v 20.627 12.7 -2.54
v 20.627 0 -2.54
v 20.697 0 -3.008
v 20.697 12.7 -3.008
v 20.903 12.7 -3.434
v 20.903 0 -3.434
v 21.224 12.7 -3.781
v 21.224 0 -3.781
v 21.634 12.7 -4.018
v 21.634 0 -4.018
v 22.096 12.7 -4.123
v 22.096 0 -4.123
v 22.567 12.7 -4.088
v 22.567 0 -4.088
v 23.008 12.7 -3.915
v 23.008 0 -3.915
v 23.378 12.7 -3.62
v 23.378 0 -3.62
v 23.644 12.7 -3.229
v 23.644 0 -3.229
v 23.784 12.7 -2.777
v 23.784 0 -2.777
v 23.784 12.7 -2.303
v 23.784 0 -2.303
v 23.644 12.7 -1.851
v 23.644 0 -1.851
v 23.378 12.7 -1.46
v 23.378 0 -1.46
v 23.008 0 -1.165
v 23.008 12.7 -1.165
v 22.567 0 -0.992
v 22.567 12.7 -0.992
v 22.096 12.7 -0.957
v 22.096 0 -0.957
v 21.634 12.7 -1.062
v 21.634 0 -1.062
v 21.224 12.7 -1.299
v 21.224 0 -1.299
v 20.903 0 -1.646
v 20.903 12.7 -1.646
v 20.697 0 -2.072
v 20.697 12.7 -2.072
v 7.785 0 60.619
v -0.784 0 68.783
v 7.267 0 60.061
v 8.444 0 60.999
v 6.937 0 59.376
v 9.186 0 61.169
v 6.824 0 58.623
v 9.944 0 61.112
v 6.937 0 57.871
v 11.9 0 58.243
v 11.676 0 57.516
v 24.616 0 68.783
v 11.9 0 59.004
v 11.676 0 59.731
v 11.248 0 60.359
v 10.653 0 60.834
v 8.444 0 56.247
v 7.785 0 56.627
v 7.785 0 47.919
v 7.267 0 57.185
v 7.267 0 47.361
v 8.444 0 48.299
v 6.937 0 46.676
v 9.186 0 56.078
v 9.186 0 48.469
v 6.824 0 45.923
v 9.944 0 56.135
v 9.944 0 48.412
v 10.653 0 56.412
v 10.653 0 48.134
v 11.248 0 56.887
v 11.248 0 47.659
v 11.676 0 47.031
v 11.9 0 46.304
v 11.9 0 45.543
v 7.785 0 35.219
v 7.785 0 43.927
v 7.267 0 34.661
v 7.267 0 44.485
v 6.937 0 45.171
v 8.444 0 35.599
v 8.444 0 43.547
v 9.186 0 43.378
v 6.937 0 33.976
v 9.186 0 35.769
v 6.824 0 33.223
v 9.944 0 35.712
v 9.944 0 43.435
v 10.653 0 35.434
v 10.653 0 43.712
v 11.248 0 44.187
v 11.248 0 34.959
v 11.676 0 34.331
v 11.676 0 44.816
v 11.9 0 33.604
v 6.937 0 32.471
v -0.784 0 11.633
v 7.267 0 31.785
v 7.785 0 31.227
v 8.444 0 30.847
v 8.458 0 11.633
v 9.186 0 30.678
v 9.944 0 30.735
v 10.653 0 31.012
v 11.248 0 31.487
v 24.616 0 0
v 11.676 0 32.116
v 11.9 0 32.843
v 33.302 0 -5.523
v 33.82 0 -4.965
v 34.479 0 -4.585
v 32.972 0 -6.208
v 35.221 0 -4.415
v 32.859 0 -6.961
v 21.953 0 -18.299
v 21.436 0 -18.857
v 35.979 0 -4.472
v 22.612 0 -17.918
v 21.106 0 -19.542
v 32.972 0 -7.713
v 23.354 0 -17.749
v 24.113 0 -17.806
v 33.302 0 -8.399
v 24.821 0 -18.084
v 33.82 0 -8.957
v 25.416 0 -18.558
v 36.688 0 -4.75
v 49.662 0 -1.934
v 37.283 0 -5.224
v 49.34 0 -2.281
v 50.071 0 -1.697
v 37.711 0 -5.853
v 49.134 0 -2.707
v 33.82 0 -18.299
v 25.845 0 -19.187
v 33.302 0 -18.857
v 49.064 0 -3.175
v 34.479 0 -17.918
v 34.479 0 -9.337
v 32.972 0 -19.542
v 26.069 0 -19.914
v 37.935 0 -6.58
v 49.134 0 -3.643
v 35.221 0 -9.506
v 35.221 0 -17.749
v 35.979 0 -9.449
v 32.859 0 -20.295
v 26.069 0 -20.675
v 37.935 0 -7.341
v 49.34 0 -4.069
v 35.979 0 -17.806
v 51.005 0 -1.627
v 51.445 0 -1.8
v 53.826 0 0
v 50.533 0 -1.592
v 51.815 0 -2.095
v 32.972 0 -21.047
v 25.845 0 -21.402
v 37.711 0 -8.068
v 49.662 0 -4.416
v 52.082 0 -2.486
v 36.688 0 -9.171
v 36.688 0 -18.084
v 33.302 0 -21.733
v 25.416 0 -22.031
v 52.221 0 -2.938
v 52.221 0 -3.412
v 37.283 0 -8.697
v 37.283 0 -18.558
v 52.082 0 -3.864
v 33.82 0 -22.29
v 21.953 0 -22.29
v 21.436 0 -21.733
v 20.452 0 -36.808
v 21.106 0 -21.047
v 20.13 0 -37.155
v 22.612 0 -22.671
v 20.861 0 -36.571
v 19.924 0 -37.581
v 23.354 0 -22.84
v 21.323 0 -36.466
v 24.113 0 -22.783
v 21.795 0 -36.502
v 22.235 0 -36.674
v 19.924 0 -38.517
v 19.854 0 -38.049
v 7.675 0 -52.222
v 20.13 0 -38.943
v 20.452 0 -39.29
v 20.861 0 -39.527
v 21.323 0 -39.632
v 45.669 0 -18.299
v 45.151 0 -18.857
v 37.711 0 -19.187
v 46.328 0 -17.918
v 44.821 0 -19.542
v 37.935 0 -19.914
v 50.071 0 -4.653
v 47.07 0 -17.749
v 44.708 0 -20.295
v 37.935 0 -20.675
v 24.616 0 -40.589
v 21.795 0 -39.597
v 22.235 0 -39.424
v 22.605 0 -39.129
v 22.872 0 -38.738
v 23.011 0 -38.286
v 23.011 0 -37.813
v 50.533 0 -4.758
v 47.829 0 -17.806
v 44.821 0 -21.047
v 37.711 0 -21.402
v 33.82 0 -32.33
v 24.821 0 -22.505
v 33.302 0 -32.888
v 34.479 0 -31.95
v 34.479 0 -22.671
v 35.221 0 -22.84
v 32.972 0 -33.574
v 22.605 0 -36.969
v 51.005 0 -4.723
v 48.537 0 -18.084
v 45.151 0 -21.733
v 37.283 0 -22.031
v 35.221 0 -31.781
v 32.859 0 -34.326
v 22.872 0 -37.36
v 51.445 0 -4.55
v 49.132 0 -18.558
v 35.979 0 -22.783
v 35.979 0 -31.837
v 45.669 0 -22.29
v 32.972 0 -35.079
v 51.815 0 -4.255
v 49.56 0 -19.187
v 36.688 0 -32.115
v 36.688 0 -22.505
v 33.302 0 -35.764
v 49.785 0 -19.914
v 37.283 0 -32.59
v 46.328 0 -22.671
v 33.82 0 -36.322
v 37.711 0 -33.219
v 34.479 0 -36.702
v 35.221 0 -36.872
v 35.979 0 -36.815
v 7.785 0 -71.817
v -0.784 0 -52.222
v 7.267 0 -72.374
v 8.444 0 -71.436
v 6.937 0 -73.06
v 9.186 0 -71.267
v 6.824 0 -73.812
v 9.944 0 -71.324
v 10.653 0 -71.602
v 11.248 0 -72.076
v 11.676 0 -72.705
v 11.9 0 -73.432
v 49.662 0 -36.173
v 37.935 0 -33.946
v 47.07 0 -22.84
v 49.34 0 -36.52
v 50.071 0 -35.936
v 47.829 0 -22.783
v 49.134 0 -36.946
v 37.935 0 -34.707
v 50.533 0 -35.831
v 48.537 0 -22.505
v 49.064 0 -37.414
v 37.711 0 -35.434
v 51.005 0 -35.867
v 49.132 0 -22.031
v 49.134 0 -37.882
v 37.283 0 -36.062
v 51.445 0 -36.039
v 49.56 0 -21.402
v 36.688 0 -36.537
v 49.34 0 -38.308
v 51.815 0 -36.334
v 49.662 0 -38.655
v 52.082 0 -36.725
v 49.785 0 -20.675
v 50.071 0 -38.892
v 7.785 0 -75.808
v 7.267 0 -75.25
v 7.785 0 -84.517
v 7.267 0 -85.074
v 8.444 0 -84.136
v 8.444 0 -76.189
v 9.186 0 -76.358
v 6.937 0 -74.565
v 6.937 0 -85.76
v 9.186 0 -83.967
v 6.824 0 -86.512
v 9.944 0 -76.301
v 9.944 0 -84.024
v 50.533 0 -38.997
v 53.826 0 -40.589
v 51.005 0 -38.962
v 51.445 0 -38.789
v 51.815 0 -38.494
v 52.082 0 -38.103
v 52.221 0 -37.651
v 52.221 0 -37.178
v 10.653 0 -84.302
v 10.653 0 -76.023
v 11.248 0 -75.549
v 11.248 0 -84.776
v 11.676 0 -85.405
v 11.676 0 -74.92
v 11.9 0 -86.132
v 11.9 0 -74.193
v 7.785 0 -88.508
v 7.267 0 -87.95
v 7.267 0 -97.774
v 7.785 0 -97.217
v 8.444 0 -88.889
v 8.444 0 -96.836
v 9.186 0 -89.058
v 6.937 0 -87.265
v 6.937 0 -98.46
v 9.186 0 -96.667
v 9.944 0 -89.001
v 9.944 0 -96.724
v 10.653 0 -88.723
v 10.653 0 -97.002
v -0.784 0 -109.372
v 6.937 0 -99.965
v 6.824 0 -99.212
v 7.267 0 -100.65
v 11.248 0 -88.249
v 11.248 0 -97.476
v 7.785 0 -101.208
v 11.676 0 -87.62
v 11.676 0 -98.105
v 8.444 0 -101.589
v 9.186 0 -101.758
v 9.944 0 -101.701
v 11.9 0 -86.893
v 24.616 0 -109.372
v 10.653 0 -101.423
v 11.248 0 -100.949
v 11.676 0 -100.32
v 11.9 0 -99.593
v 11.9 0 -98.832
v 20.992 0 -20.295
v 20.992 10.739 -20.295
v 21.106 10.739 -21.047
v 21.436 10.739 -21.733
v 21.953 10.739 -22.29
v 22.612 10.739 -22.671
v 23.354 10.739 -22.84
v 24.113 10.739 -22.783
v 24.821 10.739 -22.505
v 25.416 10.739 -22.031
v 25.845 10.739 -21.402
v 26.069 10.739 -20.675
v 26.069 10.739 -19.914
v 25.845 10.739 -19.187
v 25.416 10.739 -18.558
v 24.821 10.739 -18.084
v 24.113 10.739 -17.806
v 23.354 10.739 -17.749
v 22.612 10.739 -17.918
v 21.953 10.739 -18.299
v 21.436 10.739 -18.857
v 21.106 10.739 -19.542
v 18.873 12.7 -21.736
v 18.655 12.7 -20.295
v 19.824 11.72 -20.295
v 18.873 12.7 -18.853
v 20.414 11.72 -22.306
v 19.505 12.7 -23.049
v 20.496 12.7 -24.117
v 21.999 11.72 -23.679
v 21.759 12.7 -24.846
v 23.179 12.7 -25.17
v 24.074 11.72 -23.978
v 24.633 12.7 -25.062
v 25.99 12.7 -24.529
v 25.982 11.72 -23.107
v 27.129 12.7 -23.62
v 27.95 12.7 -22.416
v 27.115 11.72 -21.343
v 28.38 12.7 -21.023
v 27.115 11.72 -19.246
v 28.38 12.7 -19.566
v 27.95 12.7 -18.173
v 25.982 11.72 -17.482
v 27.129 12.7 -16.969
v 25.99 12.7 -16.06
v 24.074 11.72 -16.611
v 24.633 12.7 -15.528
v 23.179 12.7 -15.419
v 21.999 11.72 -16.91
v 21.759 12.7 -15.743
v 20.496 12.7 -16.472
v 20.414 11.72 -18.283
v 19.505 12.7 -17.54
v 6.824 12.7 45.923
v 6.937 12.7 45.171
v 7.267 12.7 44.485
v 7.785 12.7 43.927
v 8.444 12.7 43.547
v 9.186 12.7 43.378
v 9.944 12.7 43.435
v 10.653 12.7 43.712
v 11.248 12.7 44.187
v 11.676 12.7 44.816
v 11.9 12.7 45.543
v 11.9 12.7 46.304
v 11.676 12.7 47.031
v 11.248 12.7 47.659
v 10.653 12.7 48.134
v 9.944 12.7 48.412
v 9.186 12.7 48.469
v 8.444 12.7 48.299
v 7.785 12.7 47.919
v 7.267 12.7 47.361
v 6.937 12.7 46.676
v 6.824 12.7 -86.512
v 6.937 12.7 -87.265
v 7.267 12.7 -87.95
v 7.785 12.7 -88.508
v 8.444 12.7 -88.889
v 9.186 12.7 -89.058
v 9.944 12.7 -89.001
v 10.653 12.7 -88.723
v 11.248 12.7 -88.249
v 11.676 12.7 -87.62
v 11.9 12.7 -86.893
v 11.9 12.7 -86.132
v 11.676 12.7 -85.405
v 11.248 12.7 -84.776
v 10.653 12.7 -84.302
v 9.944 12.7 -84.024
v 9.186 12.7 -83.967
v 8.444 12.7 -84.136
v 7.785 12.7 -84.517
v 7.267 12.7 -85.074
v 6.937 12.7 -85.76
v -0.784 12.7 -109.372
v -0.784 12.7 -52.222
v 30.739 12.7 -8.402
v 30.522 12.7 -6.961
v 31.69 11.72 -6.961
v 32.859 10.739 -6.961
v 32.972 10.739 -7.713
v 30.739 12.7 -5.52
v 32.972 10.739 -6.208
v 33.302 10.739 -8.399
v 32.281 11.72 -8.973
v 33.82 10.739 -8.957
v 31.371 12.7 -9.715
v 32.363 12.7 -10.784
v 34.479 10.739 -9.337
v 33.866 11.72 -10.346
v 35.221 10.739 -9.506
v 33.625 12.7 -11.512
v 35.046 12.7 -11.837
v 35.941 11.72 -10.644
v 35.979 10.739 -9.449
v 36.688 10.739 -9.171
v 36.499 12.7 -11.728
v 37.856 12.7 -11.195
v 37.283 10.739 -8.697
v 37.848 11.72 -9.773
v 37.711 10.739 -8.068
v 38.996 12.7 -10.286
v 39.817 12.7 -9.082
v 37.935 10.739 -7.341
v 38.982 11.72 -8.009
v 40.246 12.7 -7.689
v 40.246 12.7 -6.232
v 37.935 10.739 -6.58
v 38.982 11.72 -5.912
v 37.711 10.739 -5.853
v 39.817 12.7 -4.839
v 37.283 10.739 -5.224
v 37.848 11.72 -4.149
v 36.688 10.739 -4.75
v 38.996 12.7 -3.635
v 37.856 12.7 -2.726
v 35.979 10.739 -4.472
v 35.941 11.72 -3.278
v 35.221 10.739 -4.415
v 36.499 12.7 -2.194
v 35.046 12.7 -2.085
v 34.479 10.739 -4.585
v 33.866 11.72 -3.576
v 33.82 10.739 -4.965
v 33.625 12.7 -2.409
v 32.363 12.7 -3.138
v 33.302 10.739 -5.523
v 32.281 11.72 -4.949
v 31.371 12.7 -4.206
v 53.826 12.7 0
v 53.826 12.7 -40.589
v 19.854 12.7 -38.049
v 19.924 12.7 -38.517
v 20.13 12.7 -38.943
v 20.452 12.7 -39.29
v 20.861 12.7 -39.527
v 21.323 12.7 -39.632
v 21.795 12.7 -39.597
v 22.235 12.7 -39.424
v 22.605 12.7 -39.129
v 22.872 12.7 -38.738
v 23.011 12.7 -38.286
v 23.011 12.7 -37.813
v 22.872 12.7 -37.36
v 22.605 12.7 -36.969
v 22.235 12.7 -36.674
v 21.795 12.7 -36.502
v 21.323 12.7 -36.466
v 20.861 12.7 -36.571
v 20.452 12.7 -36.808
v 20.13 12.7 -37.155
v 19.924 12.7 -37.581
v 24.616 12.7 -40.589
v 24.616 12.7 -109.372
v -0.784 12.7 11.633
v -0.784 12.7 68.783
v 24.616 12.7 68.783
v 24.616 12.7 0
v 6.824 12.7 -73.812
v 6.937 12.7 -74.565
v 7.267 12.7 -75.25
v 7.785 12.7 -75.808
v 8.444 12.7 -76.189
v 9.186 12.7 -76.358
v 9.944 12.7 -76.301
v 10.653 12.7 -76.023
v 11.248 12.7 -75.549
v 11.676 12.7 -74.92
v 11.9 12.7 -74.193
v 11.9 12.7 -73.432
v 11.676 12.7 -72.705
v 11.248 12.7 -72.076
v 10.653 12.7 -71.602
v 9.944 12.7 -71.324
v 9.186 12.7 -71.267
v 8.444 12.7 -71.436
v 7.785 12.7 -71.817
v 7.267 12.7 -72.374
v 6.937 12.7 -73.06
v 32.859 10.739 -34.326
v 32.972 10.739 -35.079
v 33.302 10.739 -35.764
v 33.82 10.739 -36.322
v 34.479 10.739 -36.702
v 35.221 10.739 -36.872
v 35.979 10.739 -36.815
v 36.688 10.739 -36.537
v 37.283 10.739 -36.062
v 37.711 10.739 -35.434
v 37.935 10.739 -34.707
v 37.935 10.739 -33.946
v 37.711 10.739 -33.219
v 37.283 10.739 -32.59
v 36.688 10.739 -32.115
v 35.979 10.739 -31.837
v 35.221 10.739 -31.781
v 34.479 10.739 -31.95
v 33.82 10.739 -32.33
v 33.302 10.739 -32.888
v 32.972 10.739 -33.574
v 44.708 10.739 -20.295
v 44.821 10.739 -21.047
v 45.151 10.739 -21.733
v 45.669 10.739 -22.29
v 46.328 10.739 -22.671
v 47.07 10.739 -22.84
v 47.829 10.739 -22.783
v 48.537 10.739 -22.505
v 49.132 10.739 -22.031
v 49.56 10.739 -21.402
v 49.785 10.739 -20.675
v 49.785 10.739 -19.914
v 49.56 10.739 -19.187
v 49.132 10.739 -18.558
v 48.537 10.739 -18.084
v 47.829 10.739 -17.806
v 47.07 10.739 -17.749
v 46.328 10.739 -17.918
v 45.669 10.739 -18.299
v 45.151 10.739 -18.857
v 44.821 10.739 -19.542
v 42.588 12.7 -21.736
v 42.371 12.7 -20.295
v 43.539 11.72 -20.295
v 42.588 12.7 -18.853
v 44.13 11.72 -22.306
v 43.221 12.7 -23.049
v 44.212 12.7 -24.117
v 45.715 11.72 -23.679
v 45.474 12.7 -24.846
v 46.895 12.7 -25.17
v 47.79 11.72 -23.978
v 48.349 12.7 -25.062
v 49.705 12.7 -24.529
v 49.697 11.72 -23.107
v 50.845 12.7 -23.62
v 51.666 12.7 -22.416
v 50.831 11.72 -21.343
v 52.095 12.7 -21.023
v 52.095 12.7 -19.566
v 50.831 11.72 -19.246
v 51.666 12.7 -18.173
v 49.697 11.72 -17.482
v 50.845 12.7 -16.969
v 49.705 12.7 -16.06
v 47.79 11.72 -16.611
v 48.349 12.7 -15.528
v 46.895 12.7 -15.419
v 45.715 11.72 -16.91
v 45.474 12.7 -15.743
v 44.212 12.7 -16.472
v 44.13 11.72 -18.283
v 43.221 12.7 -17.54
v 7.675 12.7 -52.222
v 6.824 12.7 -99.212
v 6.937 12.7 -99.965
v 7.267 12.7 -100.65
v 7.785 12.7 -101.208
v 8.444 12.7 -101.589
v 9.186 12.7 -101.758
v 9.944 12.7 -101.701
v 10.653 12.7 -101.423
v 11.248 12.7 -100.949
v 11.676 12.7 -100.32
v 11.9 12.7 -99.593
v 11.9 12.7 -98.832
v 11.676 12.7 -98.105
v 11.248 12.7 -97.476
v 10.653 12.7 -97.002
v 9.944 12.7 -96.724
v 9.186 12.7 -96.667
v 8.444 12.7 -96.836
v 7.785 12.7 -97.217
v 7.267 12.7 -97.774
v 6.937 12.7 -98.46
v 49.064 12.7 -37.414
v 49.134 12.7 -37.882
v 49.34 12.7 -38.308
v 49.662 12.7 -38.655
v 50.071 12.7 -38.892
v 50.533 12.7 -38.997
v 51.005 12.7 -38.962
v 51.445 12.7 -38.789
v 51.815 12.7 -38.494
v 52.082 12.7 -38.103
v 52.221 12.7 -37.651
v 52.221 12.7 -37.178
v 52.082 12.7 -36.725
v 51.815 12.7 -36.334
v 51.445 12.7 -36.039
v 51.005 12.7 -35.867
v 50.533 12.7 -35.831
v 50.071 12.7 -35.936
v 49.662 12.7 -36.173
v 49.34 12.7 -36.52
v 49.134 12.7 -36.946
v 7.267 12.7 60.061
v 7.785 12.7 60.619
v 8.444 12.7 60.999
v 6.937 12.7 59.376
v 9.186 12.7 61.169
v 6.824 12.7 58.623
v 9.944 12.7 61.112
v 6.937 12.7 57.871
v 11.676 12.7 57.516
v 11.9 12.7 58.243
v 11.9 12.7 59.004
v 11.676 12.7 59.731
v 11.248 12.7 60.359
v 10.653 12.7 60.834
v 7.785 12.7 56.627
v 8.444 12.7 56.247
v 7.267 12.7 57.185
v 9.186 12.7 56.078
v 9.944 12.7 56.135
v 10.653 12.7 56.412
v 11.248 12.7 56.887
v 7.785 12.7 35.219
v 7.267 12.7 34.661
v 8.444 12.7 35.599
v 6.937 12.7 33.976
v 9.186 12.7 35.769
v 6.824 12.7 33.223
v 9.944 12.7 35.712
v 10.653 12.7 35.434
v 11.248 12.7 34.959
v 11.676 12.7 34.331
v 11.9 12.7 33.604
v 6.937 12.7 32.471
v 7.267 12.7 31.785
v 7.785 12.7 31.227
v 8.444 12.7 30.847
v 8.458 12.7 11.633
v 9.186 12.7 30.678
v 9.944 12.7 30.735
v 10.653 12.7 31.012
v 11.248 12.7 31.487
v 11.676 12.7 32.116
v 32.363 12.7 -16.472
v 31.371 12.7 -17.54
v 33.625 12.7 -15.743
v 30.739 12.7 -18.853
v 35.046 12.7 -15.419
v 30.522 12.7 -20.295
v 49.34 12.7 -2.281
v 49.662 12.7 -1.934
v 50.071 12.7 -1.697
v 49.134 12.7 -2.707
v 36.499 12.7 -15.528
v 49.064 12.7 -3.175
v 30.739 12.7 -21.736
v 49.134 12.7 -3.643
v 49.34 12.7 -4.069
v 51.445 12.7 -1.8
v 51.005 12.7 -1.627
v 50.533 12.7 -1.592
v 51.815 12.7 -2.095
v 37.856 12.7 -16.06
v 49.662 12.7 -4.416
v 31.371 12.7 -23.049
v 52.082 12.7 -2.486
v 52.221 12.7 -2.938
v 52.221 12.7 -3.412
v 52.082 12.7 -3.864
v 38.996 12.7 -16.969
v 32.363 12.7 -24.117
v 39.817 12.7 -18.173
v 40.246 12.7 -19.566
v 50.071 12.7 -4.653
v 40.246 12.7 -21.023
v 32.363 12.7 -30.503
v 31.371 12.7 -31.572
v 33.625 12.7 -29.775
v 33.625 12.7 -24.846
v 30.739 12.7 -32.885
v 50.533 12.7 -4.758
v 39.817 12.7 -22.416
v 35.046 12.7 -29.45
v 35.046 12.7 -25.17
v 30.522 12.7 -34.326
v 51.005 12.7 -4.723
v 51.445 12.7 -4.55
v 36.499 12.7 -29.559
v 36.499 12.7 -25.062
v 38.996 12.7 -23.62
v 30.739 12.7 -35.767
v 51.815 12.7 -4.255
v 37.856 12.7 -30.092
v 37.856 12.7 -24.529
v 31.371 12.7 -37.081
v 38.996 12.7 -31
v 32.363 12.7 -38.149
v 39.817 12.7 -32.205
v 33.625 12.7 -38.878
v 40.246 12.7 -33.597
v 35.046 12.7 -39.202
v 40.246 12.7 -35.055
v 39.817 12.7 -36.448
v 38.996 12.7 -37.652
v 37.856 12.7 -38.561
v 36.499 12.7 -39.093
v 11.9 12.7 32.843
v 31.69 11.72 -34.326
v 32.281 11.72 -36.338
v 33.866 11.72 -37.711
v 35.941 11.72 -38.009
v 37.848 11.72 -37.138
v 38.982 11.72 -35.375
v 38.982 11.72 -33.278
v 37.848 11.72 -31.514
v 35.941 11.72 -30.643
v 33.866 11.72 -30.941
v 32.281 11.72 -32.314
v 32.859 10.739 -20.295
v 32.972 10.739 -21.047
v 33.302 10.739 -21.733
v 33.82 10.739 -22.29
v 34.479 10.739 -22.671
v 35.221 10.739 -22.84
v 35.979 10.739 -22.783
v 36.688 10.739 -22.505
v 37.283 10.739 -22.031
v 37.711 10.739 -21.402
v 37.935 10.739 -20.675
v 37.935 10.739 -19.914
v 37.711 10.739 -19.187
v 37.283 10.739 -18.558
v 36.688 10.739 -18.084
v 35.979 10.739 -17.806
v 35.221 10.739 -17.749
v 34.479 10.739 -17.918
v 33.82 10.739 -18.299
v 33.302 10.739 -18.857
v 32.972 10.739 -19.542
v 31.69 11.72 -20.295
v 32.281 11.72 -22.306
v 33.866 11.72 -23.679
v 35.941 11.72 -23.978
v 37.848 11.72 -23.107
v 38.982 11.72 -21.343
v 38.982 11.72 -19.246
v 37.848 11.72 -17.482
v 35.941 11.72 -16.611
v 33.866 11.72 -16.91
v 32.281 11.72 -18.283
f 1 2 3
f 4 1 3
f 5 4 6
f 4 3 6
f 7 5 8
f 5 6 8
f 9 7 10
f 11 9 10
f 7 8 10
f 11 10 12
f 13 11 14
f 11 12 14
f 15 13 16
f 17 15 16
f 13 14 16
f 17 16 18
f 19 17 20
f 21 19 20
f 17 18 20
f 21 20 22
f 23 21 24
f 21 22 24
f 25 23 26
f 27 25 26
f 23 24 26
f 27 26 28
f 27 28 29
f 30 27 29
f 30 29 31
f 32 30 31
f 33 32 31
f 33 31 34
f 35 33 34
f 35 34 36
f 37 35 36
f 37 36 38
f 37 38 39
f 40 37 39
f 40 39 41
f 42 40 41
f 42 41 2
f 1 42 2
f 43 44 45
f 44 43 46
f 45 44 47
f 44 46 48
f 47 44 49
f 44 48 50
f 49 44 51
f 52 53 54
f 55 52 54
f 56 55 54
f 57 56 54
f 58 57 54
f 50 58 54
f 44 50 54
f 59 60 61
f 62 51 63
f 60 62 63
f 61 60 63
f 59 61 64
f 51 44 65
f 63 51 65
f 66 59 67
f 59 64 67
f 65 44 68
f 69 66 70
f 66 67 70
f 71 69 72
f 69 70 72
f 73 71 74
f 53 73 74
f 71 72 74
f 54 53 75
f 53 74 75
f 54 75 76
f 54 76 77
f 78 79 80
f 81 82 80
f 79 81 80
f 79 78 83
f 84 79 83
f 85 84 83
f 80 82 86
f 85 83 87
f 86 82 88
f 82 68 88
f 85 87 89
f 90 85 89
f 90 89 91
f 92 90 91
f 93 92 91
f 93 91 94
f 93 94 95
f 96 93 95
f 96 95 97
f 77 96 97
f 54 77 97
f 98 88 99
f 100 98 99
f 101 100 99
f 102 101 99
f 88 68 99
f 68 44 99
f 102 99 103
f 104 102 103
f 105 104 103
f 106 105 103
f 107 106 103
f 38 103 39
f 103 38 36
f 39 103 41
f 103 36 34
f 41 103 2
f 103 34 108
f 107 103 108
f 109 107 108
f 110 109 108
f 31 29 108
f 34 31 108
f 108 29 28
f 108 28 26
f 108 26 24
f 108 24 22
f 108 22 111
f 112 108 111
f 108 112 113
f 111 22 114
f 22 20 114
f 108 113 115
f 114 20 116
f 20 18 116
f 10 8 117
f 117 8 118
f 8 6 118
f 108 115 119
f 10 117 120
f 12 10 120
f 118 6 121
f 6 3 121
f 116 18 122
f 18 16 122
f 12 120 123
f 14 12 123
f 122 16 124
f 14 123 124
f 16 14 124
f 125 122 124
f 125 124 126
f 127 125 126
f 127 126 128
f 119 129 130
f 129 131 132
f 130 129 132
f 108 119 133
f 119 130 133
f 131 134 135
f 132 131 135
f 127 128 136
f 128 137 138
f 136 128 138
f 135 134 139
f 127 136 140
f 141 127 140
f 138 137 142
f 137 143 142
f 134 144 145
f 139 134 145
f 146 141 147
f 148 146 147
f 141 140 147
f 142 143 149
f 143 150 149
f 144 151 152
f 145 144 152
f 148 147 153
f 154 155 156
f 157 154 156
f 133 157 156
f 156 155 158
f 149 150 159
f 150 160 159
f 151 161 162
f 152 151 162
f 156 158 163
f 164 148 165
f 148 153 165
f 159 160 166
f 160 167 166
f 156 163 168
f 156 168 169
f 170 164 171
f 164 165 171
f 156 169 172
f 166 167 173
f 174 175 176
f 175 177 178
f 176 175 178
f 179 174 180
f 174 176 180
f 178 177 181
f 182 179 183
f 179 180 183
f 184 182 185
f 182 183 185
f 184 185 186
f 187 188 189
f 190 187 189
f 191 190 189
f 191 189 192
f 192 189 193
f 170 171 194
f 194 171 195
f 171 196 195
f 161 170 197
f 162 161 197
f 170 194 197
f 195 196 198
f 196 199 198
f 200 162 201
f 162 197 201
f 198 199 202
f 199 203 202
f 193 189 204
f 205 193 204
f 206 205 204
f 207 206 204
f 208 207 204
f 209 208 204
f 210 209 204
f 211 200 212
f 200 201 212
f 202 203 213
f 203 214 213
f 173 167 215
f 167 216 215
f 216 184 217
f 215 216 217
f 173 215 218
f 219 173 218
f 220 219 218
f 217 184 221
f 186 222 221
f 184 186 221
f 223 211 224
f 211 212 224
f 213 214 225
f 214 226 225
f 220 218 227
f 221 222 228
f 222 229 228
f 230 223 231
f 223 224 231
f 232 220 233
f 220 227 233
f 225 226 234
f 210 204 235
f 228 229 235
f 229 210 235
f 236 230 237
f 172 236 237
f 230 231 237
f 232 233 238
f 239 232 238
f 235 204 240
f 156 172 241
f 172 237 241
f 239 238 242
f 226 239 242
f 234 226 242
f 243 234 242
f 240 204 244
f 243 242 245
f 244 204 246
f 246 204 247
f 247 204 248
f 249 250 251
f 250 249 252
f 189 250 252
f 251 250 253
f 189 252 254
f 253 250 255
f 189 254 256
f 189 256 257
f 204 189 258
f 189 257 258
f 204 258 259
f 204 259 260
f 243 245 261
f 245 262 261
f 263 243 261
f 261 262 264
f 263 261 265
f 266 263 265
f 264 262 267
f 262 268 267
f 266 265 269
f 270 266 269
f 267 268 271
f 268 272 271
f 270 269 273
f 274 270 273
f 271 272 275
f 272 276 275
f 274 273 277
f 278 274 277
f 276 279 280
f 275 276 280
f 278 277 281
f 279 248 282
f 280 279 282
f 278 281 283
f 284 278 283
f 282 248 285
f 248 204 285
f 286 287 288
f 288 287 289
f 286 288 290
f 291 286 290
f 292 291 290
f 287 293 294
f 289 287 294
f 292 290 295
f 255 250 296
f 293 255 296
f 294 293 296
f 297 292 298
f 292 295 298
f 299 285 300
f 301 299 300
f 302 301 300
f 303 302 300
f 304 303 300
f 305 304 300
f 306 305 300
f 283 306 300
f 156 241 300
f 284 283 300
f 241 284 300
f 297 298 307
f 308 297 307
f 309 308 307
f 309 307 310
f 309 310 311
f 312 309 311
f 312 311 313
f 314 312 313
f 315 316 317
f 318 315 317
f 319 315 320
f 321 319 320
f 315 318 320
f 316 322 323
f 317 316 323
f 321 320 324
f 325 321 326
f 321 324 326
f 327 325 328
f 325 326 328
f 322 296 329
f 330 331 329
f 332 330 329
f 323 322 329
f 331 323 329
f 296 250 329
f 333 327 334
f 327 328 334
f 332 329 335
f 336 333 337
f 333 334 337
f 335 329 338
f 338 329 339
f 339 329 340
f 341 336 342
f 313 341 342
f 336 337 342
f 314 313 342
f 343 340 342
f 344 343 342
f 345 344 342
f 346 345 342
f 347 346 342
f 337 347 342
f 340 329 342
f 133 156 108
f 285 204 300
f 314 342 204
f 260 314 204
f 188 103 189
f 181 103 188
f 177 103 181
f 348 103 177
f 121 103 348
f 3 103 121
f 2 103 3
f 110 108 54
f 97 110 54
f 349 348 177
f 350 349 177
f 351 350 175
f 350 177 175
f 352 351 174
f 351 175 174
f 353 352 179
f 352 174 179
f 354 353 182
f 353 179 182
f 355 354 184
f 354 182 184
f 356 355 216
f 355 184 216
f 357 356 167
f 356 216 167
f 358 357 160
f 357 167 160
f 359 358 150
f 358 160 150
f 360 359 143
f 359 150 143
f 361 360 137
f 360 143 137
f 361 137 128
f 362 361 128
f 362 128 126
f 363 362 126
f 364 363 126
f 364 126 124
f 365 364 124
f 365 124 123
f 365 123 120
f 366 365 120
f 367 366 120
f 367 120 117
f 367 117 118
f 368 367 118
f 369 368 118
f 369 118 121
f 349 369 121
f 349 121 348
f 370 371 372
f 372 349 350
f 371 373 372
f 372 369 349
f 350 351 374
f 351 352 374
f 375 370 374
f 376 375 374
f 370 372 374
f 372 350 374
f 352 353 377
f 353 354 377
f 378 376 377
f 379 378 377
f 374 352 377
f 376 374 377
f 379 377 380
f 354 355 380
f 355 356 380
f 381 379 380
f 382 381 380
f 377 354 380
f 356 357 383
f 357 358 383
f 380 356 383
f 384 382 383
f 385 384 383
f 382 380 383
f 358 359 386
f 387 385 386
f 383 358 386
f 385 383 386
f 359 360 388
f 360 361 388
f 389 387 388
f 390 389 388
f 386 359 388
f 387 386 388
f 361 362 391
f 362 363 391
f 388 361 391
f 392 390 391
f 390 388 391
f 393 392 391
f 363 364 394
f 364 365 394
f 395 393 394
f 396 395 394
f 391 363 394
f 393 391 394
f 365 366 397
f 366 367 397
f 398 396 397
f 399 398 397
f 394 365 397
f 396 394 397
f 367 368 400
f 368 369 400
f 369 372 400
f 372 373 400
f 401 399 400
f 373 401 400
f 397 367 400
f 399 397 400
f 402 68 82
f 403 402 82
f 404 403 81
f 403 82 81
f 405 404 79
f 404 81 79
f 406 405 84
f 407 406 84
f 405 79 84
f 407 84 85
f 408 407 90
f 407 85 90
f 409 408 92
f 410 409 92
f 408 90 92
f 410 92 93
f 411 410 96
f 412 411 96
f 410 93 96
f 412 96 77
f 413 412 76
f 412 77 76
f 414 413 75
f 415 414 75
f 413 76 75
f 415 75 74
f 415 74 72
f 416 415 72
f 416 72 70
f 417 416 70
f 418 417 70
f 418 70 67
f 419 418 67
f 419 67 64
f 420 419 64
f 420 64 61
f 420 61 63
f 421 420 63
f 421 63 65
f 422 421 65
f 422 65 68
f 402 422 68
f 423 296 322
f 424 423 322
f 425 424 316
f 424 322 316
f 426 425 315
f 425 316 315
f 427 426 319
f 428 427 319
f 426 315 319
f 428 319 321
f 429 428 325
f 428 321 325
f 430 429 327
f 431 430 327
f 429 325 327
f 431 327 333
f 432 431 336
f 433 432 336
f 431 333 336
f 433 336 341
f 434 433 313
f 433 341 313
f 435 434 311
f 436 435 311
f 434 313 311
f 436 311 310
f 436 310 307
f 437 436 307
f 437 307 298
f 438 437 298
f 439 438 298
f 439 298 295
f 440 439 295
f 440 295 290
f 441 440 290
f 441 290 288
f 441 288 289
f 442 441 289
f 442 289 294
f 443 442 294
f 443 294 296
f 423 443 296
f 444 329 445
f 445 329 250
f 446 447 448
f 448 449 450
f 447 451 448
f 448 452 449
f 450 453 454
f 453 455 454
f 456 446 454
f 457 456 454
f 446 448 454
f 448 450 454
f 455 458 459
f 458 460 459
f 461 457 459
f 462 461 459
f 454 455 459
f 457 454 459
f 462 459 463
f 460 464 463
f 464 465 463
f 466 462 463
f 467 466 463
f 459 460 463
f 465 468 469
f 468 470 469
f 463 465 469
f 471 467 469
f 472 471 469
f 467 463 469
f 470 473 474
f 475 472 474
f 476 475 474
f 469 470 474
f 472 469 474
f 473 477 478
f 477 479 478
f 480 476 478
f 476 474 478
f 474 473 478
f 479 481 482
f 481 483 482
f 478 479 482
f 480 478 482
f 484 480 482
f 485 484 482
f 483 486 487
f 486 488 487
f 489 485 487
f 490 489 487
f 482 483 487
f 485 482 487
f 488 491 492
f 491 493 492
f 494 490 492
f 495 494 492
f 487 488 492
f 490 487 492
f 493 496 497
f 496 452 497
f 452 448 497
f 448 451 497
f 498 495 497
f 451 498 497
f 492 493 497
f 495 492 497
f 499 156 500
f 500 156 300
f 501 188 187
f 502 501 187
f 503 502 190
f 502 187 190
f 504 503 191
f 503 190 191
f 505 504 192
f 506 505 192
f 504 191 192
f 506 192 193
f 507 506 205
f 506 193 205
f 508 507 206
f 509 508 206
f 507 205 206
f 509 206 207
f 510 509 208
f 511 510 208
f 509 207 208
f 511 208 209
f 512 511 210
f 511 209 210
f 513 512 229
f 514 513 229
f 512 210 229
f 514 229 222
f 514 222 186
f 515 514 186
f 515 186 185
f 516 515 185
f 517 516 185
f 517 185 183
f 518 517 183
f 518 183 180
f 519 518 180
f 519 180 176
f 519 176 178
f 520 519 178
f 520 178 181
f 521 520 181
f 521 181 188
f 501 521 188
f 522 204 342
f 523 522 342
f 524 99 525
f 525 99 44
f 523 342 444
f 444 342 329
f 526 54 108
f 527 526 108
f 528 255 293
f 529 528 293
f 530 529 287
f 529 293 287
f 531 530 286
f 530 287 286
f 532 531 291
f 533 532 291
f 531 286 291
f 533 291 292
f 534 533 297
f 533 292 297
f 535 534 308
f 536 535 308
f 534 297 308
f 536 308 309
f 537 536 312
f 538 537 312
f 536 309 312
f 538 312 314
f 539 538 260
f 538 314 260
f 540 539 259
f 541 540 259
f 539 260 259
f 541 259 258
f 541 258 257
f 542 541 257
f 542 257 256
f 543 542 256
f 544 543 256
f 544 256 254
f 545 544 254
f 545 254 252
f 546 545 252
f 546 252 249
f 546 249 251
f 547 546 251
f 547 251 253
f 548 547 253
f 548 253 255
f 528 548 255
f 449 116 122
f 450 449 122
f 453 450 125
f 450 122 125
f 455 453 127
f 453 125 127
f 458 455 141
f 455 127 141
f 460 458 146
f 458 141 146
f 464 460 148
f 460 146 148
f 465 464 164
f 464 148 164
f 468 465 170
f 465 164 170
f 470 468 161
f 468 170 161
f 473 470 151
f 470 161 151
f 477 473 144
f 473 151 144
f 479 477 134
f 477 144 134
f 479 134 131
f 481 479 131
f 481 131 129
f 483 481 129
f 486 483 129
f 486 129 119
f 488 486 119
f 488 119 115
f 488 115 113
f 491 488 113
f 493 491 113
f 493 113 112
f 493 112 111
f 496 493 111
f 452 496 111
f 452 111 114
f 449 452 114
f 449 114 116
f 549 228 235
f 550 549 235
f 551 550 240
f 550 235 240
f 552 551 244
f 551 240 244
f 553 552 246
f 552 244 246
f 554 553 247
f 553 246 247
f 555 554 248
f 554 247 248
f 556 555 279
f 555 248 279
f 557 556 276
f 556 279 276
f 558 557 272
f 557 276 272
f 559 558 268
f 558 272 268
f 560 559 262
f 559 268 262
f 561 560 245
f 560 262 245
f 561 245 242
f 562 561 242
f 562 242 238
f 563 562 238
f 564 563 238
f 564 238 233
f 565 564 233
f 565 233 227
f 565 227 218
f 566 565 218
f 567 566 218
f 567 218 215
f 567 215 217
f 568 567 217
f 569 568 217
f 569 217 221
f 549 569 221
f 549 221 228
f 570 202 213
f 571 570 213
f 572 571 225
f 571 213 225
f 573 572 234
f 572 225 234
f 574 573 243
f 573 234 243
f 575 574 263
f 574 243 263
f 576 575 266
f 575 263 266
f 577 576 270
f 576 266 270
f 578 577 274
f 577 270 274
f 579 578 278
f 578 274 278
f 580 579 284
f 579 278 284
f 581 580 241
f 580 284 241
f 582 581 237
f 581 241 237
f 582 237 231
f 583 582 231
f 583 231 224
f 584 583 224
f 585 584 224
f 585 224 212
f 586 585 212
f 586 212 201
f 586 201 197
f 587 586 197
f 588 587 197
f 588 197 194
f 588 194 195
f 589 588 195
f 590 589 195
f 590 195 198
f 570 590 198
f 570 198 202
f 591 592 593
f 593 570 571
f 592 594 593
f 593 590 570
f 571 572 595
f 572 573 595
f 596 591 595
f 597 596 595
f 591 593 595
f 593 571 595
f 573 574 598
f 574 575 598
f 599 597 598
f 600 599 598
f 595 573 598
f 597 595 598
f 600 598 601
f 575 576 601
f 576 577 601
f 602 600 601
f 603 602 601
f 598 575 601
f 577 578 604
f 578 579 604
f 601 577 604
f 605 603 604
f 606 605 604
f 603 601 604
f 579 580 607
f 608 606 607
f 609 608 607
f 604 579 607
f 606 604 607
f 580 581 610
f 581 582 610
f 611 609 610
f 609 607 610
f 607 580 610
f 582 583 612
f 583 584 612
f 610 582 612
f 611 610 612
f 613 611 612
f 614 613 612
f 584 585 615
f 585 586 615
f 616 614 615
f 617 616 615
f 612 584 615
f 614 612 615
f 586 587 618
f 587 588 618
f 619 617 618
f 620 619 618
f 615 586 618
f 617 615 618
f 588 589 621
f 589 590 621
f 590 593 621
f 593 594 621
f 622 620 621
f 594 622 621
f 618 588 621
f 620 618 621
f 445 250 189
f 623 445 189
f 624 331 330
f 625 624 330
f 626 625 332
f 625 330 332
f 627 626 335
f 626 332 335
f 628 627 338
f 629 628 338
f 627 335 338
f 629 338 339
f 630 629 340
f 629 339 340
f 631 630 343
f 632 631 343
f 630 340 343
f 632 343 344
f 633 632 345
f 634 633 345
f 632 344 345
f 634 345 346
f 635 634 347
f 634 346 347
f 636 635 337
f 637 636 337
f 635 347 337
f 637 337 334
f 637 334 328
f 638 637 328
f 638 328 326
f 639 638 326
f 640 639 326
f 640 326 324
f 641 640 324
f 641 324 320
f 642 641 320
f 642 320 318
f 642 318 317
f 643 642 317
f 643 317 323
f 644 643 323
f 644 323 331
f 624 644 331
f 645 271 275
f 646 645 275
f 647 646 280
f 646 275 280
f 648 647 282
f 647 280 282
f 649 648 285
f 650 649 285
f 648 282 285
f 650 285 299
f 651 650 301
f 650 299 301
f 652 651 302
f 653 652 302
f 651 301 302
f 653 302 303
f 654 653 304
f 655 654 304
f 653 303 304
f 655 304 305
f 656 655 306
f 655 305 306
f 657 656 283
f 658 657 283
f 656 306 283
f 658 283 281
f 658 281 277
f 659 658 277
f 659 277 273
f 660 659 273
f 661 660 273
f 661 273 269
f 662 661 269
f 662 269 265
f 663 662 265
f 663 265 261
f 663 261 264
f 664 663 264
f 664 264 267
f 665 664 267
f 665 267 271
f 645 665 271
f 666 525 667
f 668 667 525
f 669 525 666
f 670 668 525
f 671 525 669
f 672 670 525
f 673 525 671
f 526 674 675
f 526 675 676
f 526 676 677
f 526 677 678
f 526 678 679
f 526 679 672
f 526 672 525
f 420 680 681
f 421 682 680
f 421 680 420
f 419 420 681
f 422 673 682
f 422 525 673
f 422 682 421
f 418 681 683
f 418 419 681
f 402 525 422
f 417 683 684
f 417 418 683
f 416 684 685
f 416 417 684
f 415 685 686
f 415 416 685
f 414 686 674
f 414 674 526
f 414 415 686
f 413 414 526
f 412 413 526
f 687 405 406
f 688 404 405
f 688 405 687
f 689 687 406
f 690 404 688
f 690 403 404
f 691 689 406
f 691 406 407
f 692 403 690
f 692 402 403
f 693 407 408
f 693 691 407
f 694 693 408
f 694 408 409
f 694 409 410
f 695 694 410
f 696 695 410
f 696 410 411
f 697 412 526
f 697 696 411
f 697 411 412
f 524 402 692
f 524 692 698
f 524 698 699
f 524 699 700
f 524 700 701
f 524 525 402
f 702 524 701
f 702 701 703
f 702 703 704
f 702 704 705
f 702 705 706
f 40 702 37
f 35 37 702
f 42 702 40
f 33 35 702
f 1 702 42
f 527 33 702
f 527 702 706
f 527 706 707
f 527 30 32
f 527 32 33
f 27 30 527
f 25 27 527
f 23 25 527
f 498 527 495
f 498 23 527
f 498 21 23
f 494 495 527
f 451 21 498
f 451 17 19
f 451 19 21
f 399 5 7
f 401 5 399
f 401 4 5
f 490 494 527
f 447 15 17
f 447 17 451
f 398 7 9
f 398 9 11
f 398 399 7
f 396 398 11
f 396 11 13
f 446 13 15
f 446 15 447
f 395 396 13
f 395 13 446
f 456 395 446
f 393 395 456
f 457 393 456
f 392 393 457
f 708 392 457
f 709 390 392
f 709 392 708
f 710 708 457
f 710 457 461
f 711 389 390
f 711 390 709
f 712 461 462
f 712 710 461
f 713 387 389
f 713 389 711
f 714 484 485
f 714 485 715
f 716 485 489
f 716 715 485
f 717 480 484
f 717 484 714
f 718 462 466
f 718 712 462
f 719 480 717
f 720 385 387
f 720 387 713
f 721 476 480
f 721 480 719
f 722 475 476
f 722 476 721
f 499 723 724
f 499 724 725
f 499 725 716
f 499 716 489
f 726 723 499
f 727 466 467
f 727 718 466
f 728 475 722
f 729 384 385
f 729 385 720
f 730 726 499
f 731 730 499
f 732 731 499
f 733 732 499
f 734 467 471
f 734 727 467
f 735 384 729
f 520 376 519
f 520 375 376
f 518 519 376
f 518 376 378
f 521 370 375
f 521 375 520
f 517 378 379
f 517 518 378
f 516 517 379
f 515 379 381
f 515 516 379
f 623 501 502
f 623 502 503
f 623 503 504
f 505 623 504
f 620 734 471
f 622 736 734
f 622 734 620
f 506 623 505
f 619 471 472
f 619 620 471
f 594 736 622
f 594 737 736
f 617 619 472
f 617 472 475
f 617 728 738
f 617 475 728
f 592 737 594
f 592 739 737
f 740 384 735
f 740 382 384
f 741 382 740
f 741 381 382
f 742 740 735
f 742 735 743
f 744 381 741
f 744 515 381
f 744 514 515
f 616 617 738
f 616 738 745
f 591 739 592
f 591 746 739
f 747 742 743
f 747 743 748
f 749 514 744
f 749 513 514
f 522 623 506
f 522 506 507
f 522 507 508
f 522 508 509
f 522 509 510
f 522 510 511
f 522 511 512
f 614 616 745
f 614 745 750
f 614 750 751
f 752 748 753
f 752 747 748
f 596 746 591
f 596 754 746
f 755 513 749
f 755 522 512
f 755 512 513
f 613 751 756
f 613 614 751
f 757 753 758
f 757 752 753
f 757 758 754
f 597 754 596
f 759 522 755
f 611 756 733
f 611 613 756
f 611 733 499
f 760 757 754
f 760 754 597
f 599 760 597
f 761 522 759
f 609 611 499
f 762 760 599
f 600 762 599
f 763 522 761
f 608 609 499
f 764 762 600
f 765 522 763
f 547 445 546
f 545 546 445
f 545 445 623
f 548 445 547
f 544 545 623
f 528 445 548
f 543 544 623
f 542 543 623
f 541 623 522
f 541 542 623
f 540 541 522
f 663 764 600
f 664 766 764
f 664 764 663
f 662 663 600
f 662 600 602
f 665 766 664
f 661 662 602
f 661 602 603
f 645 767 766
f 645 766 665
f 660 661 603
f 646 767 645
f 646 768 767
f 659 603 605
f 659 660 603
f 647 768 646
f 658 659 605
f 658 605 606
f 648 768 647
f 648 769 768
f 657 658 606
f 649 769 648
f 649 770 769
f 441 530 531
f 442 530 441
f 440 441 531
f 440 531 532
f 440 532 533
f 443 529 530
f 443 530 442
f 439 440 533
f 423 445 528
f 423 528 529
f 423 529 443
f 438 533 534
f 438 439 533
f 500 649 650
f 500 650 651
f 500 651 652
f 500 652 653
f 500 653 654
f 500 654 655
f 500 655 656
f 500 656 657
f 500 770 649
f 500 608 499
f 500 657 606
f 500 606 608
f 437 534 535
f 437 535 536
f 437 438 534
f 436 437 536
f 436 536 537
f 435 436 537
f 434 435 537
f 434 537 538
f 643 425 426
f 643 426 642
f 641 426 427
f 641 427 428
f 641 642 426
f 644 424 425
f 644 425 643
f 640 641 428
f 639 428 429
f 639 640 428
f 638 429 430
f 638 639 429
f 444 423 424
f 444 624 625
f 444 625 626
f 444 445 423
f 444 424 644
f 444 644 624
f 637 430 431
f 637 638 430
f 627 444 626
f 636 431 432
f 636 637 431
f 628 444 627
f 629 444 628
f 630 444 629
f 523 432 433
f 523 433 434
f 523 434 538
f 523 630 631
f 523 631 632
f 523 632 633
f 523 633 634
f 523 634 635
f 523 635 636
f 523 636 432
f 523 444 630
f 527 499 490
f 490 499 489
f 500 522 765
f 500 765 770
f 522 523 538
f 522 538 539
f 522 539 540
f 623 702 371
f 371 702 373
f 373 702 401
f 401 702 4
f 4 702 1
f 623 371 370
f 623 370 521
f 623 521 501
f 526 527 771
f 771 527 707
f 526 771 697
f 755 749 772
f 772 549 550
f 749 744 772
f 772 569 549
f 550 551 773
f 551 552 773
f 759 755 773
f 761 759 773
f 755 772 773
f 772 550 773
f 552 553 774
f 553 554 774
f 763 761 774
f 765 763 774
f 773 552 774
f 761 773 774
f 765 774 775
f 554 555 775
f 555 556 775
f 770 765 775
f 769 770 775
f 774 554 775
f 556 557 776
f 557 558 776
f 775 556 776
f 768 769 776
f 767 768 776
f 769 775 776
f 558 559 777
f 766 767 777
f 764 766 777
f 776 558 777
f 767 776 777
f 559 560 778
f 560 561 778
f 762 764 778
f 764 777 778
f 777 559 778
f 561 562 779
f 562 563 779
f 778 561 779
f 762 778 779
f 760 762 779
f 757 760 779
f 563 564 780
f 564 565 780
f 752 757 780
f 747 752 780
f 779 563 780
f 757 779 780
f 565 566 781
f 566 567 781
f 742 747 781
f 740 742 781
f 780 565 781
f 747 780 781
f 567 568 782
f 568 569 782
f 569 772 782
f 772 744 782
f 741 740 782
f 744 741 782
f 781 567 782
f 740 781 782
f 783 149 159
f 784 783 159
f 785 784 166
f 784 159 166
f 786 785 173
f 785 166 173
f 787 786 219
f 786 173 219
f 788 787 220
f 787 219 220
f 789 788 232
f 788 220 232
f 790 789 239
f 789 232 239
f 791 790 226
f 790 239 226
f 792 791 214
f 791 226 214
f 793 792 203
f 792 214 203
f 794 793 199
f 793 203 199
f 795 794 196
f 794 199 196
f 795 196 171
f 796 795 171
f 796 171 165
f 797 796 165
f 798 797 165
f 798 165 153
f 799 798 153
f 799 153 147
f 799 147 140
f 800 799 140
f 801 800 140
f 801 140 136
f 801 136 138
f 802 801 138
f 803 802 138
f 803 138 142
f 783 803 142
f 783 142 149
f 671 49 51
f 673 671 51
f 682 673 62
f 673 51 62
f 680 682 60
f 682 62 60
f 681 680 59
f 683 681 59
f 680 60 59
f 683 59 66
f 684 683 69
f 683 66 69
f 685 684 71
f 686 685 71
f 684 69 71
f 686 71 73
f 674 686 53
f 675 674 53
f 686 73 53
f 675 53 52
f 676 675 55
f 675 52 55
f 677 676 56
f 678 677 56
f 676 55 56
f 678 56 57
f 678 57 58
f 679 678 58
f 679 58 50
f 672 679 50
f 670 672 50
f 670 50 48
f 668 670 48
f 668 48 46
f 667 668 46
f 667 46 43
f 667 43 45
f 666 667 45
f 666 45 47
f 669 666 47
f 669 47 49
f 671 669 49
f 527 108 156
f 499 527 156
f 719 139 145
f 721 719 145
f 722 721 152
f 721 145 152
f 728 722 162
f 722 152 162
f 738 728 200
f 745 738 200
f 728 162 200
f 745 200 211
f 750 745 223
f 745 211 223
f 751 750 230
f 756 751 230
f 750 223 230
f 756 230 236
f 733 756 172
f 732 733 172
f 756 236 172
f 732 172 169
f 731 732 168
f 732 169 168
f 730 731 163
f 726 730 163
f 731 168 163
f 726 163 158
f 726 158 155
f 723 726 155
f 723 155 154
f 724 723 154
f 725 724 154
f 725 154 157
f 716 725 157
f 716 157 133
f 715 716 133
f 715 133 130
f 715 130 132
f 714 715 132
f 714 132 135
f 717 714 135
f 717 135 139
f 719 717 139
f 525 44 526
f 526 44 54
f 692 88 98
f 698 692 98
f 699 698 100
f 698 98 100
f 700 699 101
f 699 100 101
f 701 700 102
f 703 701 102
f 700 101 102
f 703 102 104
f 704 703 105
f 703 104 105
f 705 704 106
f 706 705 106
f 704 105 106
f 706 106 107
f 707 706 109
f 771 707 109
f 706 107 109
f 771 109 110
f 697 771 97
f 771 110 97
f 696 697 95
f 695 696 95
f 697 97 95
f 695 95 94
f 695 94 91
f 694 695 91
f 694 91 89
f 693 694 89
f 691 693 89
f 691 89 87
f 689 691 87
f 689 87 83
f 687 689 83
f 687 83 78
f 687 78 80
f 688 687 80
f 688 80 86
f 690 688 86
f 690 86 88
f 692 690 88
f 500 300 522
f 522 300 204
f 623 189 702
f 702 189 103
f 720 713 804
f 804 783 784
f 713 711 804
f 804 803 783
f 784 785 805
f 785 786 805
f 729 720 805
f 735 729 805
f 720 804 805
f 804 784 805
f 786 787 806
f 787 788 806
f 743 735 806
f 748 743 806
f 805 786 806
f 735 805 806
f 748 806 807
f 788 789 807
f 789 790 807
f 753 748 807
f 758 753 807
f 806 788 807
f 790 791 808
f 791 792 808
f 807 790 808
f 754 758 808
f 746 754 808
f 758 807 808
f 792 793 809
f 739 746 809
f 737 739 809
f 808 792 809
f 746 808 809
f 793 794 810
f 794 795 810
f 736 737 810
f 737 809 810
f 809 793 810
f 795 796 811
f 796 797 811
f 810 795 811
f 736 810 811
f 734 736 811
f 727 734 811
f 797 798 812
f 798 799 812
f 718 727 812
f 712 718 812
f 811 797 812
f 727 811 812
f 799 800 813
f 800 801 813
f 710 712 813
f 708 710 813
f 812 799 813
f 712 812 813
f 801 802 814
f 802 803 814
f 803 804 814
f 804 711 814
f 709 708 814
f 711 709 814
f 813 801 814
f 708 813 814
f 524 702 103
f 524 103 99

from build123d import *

# Parameters (mm, degrees)
BOSS_EXTRUDE1_DEPTH                                = 12.7
F_1_4_20_TAPPED_HOLE1_D                            = 5.1054
F_1_4_20_TAPPED_HOLE1_DEPTH                        = 12.7
F_1_4_20_TAPPED_HOLE2_D                            = 5.1054
F_1_4_20_TAPPED_HOLE2_DEPTH                        = 12.7
LPATTERN1_COUNT                                    = 3
LPATTERN1_PITCH                                    = 12.7
LPATTERN2_COUNT                                    = 3
LPATTERN2_PITCH                                    = 12.7
CSK_FOR_10_FLAT_HEAD_MACHINE_SCREW_100_D           = 5.1054
CSK_FOR_10_FLAT_HEAD_MACHINE_SCREW_100_DEPTH       = 12.7
CSK_FOR_10_FLAT_HEAD_MACHINE_SCREW_100_CSINK_D     = 9.779
CSK_FOR_10_FLAT_HEAD_MACHINE_SCREW_100_CSINK_ANGLE = 100
F_1_8_0_125_DIAMETER_HOLE1_D                       = 3.175
F_1_8_0_125_DIAMETER_HOLE1_DEPTH                   = 12.7
CSK_FOR_10_FLAT_HEAD_MACHINE_SCREW_2_D             = 5.1054
CSK_FOR_10_FLAT_HEAD_MACHINE_SCREW_2_DEPTH         = 12.7
CSK_FOR_10_FLAT_HEAD_MACHINE_SCREW_2_CSINK_D       = 9.779
CSK_FOR_10_FLAT_HEAD_MACHINE_SCREW_2_CSINK_ANGLE   = 100


with BuildPart() as part:
    # Sketch1 → Boss-Extrude1 (new body)
    with BuildSketch(Plane(origin=(0, 0, 0), x_dir=(1, 0, 0), z_dir=(0, 1, 0))):
        Polygon((24.616308072, 0), (53.826308072, 0), (53.826308072, 40.5892), (24.616308072, 40.5892), (24.616308072, 109.3724), (-0.783691928, 109.3724), (-0.783691928, 52.2224), (7.674508072, 52.2224), (8.4582, -11.6332), (-0.783691928, -11.6332), (-0.783691928, -68.7832), (24.616308072, -68.7832), align=None)
    extrude(amount=BOSS_EXTRUDE1_DEPTH)

    # 1/4-20 Tapped Hole1
    with Locations(Plane(origin=(0, 12.7, 0), x_dir=(1, 0, 0), z_dir=(0, 1, 0))):
        with Locations((9.376308072, 99.2124)):
            f_1_4_20_tapped_hole1 = Hole(F_1_4_20_TAPPED_HOLE1_D / 2, depth=F_1_4_20_TAPPED_HOLE1_DEPTH)

    # 1/4-20 Tapped Hole2
    with Locations(Plane(origin=(0, 12.7, 0), x_dir=(1, 0, 0), z_dir=(0, 1, 0))):
        with Locations((9.376308072, -58.6232)):
            f_1_4_20_tapped_hole2 = Hole(F_1_4_20_TAPPED_HOLE2_D / 2, depth=F_1_4_20_TAPPED_HOLE2_DEPTH)

    # LPattern1: 1/4-20 Tapped Hole1 ×3
    with Locations(*[(0, 0, i * LPATTERN1_PITCH) for i in range(1, LPATTERN1_COUNT)]):
        add(f_1_4_20_tapped_hole1, mode=Mode.SUBTRACT)

    # LPattern2: 1/4-20 Tapped Hole2 ×3
    with Locations(*[(0, 0, -i * LPATTERN2_PITCH) for i in range(1, LPATTERN2_COUNT)]):
        add(f_1_4_20_tapped_hole2, mode=Mode.SUBTRACT)

    # CSK for _10 Flat Head Machine Screw _100
    with Locations(Plane(origin=(0, 12.7, 0), x_dir=(1, 0, 0), z_dir=(0, 1, 0))):
        with Locations((35.411308072, 20.2946), (35.411308072, 34.326173542), (35.411308072, 6.960743489)):
            CounterSinkHole(CSK_FOR_10_FLAT_HEAD_MACHINE_SCREW_100_D / 2, CSK_FOR_10_FLAT_HEAD_MACHINE_SCREW_100_CSINK_D / 2, depth=CSK_FOR_10_FLAT_HEAD_MACHINE_SCREW_100_DEPTH, counter_sink_angle=CSK_FOR_10_FLAT_HEAD_MACHINE_SCREW_100_CSINK_ANGLE)

    # 1/8 (0.125) Diameter Hole1
    with Locations(Plane(origin=(0, 12.7, 0), x_dir=(1, 0, 0), z_dir=(0, 1, 0))):
        with Locations((21.441308072, 38.0492), (22.214178029, 2.54), (50.651308072, 3.175), (50.651308072, 37.4142)):
            Hole(F_1_8_0_125_DIAMETER_HOLE1_D / 2, depth=F_1_8_0_125_DIAMETER_HOLE1_DEPTH)

    # CSK for _10 Flat Head Machine Screw  2
    with Locations(Plane(origin=(0, 12.7, 0), x_dir=(1, 0, 0), z_dir=(0, 1, 0))):
        with Locations((47.260541085, 20.2946), (23.544844519, 20.2946)):
            CounterSinkHole(CSK_FOR_10_FLAT_HEAD_MACHINE_SCREW_2_D / 2, CSK_FOR_10_FLAT_HEAD_MACHINE_SCREW_2_CSINK_D / 2, depth=CSK_FOR_10_FLAT_HEAD_MACHINE_SCREW_2_DEPTH, counter_sink_angle=CSK_FOR_10_FLAT_HEAD_MACHINE_SCREW_2_CSINK_ANGLE)


solid = part.part
